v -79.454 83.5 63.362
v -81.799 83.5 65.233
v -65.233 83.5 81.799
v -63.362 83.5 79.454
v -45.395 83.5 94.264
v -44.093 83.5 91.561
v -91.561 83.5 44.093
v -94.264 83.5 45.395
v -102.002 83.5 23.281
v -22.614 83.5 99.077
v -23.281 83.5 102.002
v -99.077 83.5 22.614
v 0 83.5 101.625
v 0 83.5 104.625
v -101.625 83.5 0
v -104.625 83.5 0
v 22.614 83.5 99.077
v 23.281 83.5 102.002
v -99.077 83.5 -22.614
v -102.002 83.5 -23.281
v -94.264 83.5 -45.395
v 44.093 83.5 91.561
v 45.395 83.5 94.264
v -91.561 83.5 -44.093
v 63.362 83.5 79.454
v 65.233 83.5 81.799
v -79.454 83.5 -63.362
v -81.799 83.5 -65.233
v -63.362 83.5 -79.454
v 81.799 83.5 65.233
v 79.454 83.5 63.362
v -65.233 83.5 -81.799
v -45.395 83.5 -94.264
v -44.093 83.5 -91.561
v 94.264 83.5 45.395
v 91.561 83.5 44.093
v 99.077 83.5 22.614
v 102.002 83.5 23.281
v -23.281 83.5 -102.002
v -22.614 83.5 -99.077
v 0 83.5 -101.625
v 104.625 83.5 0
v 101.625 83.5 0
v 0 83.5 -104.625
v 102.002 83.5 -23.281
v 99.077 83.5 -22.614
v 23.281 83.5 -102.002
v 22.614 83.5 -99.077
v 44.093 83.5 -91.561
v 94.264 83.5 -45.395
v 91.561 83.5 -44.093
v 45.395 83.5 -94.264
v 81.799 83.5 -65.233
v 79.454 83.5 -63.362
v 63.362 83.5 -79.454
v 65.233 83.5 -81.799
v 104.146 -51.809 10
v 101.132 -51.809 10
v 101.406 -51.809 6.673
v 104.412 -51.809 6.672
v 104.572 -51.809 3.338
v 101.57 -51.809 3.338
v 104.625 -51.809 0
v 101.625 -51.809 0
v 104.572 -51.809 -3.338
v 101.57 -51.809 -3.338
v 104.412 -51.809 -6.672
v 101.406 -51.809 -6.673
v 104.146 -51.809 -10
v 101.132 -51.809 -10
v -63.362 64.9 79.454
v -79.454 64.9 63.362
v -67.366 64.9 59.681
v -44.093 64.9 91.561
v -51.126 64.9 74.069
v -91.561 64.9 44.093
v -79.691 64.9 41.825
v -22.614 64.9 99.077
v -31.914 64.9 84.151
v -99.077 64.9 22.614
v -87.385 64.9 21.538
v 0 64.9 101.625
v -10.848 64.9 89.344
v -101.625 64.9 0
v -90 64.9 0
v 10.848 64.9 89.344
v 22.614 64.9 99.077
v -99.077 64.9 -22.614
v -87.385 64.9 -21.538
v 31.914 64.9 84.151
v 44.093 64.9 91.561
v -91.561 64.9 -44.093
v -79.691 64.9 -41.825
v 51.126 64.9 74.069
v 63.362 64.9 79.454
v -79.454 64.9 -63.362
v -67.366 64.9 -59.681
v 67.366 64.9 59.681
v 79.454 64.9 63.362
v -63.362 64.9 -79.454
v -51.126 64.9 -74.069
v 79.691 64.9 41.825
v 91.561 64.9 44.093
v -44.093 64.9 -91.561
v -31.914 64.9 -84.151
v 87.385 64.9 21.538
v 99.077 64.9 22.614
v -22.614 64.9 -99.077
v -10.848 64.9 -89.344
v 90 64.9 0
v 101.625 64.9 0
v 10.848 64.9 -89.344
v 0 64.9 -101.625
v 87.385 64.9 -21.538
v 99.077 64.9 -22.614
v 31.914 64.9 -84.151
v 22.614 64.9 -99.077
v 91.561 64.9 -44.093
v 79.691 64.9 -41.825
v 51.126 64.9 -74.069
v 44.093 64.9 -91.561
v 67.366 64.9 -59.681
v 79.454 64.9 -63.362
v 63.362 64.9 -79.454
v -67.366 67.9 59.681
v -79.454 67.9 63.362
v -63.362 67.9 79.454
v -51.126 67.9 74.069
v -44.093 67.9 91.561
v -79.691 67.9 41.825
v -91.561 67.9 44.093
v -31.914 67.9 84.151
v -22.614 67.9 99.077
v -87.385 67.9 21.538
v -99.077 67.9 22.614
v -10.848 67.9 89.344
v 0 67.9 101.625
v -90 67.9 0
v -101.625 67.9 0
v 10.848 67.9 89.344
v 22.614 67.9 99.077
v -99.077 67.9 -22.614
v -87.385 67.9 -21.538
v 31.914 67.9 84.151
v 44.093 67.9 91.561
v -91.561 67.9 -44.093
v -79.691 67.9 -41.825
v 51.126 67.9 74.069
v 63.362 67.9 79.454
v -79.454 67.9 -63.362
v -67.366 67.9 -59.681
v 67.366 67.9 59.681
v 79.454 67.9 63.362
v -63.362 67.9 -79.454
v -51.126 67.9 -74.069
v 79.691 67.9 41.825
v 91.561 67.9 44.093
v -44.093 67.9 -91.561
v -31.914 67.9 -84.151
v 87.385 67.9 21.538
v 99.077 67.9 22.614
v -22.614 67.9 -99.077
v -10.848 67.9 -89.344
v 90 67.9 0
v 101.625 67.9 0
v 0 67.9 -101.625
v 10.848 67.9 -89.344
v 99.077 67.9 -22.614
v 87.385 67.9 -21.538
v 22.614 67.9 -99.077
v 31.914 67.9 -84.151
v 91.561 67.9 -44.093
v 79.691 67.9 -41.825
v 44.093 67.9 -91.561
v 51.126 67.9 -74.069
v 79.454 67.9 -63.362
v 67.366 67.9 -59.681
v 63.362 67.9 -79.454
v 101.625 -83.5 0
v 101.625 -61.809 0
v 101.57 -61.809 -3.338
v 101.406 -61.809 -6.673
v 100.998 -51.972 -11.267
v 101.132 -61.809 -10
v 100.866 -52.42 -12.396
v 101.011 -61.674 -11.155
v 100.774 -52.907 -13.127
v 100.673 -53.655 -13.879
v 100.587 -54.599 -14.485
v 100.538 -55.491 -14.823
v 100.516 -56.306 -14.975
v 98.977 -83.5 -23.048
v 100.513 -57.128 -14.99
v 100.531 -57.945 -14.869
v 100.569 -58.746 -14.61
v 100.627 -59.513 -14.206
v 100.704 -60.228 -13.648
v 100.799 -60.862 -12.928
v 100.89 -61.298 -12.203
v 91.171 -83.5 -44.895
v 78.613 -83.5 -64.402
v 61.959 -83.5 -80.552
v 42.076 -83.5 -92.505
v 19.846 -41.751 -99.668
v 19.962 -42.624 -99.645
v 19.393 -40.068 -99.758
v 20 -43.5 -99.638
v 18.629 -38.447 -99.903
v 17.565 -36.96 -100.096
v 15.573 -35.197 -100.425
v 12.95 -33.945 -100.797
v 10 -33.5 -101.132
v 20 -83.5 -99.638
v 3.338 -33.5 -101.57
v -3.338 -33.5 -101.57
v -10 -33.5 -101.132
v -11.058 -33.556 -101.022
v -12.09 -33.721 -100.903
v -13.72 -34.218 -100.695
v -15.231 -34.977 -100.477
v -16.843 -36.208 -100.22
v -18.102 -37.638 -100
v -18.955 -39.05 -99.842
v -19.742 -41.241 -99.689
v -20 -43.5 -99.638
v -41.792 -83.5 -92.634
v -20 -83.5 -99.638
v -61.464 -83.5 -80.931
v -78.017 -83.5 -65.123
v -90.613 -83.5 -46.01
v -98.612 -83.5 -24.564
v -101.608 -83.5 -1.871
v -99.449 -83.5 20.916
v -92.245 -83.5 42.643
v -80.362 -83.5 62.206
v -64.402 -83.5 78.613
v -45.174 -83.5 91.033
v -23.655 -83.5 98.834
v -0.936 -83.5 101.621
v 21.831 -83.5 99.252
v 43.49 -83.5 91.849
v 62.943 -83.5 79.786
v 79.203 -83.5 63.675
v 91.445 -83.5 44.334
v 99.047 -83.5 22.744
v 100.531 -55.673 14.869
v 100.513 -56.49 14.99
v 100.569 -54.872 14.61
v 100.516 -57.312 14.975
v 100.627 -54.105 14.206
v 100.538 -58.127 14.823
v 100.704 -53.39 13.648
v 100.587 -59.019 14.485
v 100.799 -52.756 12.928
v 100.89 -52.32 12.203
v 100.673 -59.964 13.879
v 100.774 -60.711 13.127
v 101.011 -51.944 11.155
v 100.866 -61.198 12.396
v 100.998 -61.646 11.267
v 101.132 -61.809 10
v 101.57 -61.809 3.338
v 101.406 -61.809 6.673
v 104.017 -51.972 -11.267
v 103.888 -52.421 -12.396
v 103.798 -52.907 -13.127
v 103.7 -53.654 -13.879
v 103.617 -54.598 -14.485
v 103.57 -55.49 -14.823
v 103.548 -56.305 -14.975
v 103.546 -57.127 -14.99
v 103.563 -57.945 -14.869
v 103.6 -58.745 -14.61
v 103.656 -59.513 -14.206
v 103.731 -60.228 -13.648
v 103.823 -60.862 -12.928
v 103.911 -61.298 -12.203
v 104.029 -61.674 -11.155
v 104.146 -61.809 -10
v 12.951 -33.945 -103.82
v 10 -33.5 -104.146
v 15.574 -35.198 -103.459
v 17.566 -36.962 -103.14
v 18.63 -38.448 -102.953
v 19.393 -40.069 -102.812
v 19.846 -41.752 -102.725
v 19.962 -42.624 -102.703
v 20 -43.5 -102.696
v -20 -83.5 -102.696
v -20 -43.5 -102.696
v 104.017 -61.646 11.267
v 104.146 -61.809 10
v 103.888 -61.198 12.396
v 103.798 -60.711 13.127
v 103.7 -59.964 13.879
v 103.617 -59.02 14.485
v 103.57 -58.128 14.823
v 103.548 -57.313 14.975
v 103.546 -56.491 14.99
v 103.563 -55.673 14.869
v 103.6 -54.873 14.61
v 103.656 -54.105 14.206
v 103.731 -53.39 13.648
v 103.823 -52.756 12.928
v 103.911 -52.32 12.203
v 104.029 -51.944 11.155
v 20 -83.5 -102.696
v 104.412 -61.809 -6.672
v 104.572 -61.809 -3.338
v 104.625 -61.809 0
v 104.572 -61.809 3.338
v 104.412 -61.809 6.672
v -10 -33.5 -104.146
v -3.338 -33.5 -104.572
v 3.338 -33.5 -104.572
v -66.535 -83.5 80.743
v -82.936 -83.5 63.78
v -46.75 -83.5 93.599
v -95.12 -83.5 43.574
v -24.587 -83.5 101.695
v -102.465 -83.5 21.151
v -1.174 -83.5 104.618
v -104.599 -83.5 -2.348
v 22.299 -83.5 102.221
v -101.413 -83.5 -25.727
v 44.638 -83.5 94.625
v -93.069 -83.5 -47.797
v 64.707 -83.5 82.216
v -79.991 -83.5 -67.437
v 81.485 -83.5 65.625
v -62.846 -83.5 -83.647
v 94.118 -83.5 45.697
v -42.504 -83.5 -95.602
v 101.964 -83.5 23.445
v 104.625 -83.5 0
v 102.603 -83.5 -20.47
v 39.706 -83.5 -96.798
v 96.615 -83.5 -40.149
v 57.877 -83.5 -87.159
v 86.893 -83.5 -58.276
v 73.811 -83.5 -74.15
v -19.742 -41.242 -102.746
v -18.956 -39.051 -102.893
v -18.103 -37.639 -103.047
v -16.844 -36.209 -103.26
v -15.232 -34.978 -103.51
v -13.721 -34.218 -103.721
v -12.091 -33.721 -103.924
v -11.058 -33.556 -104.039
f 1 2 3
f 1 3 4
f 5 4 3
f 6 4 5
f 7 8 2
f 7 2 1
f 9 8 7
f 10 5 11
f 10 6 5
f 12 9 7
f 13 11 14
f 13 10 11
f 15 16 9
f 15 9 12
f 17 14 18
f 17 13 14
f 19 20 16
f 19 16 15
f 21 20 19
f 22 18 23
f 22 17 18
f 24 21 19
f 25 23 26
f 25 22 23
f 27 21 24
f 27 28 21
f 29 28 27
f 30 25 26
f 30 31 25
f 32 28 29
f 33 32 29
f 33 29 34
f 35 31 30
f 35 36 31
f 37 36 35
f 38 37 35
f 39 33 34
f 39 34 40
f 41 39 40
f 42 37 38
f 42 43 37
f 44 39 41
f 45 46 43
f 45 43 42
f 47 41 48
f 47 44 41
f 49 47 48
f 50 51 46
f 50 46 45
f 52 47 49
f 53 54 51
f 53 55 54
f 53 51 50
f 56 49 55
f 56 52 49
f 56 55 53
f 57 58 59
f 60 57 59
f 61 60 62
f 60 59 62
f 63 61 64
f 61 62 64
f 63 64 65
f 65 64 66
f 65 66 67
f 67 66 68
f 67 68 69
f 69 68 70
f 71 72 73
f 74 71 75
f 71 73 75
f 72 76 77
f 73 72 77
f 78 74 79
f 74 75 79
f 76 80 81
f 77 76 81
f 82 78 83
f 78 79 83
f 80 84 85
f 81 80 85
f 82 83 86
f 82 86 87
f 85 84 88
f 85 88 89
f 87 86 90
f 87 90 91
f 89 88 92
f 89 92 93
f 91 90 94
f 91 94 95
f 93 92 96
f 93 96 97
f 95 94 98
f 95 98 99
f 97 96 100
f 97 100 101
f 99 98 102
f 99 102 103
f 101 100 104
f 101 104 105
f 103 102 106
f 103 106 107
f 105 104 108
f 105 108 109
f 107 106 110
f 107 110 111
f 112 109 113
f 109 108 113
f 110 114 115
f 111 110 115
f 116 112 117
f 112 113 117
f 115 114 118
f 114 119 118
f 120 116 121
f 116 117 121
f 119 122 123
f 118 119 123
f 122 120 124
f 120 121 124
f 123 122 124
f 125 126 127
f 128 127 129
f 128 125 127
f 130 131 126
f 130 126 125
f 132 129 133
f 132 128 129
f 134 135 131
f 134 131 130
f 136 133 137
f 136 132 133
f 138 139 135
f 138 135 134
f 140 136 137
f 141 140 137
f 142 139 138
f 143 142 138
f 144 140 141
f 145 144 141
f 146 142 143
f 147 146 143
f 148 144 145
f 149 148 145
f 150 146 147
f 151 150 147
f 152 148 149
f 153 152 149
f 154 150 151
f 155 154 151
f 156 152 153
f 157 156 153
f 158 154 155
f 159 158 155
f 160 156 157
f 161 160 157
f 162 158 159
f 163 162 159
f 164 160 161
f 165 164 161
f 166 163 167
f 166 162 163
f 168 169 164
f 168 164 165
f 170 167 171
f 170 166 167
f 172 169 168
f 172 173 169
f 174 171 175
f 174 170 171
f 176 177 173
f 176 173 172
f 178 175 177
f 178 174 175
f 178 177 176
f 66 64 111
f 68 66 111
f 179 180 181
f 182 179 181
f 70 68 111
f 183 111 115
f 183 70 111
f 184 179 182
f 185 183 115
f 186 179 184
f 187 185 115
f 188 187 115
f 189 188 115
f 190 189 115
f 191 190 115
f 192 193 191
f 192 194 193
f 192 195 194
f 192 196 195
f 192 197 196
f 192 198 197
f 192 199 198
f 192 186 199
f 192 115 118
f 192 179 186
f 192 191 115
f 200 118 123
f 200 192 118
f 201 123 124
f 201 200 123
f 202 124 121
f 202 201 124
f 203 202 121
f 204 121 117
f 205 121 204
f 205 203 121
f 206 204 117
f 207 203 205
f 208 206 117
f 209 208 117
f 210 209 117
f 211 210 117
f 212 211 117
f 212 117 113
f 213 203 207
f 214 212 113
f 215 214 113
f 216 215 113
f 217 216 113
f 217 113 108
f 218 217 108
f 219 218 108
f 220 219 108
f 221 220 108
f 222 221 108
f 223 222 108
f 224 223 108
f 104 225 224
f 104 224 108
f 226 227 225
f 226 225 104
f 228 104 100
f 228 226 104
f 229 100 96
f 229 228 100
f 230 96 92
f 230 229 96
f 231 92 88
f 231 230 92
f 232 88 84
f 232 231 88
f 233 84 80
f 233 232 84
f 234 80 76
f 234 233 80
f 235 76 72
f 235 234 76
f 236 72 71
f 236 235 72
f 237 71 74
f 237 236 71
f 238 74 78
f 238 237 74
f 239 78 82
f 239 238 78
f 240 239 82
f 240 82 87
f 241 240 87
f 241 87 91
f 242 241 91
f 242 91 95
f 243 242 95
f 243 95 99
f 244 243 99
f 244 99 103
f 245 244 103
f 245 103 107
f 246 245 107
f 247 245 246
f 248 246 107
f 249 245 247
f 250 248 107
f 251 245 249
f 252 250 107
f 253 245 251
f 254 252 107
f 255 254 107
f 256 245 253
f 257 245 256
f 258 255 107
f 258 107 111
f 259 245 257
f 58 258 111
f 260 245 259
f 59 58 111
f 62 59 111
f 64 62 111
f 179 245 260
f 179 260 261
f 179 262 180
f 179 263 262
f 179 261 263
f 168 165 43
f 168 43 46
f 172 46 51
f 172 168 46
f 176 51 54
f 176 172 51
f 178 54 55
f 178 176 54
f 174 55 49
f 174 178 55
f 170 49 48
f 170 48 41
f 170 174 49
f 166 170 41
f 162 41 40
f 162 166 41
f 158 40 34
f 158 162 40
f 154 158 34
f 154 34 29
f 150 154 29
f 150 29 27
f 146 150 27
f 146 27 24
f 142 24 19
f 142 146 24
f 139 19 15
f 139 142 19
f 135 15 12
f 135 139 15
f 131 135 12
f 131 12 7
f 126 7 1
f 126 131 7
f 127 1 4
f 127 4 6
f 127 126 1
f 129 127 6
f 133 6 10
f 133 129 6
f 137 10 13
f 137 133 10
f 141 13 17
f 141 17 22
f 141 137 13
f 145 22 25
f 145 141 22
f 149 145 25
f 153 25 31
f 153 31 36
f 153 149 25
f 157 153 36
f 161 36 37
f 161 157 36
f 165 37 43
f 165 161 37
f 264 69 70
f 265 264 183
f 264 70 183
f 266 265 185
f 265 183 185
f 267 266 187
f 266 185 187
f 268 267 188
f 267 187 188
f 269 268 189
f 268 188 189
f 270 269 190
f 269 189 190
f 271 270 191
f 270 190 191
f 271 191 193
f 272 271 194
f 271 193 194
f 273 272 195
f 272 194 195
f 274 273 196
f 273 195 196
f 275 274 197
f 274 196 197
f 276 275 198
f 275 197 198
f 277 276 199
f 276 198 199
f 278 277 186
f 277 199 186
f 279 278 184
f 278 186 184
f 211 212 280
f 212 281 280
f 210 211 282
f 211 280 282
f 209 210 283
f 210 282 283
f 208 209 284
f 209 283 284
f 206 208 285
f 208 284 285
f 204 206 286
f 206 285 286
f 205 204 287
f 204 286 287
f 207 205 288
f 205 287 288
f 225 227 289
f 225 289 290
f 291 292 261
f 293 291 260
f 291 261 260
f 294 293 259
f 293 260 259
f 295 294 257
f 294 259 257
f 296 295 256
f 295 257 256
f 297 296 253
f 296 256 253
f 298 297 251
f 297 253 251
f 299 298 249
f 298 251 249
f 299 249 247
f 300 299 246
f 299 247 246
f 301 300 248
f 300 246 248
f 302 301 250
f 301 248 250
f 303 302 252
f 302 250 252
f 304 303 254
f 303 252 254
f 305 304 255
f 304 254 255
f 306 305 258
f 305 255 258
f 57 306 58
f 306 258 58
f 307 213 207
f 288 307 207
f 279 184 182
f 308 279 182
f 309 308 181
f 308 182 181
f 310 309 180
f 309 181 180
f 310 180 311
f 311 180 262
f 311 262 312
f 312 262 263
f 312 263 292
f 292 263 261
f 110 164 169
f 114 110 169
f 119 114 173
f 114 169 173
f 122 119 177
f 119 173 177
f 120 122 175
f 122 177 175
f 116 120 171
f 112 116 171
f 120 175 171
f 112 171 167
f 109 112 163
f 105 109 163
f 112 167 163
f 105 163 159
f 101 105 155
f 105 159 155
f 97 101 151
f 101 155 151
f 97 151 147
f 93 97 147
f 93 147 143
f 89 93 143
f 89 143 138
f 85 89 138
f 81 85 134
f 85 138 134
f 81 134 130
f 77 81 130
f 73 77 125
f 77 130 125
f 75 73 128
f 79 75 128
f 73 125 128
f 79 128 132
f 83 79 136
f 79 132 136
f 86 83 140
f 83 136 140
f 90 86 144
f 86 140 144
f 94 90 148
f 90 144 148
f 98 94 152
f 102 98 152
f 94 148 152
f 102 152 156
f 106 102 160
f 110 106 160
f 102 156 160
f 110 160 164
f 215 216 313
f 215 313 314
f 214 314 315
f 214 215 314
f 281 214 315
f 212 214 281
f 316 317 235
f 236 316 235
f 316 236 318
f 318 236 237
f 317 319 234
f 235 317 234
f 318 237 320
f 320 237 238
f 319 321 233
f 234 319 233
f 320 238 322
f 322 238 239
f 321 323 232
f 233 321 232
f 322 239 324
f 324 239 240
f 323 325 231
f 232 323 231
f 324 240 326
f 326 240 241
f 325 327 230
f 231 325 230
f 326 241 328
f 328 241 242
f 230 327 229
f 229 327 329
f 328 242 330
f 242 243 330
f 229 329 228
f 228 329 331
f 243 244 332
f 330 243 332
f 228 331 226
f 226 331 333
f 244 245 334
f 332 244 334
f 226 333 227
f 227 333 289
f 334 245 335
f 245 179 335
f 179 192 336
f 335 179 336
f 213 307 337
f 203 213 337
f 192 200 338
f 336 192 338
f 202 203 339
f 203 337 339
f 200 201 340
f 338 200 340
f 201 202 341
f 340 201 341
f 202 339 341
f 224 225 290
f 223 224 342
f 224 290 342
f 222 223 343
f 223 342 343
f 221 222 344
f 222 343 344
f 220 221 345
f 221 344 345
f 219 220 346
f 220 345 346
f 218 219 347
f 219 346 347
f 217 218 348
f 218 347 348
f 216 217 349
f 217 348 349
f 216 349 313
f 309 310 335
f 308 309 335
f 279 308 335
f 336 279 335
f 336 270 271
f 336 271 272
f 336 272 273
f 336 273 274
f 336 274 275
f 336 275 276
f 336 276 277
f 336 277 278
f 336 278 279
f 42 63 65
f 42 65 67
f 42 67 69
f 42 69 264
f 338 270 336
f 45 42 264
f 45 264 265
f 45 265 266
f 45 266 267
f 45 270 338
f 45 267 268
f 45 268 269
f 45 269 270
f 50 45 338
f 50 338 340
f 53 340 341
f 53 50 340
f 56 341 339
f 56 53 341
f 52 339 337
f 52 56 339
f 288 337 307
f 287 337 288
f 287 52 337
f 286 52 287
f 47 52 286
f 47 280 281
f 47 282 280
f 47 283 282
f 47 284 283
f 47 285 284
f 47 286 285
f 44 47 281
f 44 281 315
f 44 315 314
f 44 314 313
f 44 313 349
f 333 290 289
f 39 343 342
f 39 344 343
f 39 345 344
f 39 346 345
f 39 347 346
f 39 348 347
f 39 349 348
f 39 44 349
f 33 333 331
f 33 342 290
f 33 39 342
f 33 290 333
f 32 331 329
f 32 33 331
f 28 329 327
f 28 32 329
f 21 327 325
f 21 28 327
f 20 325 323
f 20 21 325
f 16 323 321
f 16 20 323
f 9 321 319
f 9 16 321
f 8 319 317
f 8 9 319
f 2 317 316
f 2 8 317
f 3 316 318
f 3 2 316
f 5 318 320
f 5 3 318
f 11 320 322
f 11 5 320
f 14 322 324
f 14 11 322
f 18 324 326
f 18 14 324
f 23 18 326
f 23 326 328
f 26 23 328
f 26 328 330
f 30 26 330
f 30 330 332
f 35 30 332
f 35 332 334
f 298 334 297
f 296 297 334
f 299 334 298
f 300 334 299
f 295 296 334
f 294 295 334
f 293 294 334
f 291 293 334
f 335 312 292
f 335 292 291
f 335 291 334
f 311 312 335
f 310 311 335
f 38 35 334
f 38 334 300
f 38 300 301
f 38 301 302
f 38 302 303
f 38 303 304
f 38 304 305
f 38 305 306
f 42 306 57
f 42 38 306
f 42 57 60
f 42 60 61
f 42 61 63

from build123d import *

# Parameters (mm, degrees)
SKETCH1_R           = 104.625
SKETCH1_R_2         = 101.625
BOSS_EXTRUDE1_DEPTH = 83.5
CUT_EXTRUDE1_REACH  = 106.625
SKETCH2_W           = 40
SKETCH2_H           = 50
CUT_EXTRUDE2_REACH  = 106.625
SKETCH4_R           = 101.625
SKETCH4_R_2         = 90
BOSS_EXTRUDE2_DEPTH = 3
FILLET1_R           = 10


with BuildPart() as part:
    # Sketch1 → Boss-Extrude1 (new body, symmetric)
    with BuildSketch(Plane(origin=(0, 0, 0), x_dir=(1, 0, 0), z_dir=(0, 1, 0))):
        Circle(SKETCH1_R)
        Circle(SKETCH1_R_2, mode=Mode.SUBTRACT)
    extrude(amount=BOSS_EXTRUDE1_DEPTH, both=True)

    # Sketch2 → Cut-Extrude1 (cut, up to next)
    with BuildSketch(Plane.XY, mode=Mode.PRIVATE) as cut_extrude1_sk1:
        with Locations((0, -58.5)):
            Rectangle(SKETCH2_W, SKETCH2_H)
    cut_extrude1_tool1 = extrude(cut_extrude1_sk1.sketch, amount=-CUT_EXTRUDE1_REACH, mode=Mode.PRIVATE) & part.part
    add(cut_extrude1_tool1.solids().sort_by_distance((0, -58.5, 0))[0], mode=Mode.SUBTRACT)

    # Sketch3 → Cut-Extrude2 (cut, up to next)
    with BuildSketch(Plane(origin=(0, 0, 0), x_dir=(0, 0, -1), z_dir=(1, 0, 0)), mode=Mode.PRIVATE) as cut_extrude2_sk1:
        with BuildLine():
            Line((-10, -51.809036258), (10, -51.809036258))
            ThreePointArc((10, -51.809036258), (15, -56.809036258), (10, -61.809036258))
            Line((10, -61.809036258), (-10, -61.809036258))
            ThreePointArc((-10, -61.809036258), (-15, -56.809036258), (-10, -51.809036258))
        make_face()
    cut_extrude2_tool1 = extrude(cut_extrude2_sk1.sketch, amount=CUT_EXTRUDE2_REACH, mode=Mode.PRIVATE) & part.part
    add(cut_extrude2_tool1.solids().sort_by_distance((0, -56.809036, 0))[0], mode=Mode.SUBTRACT)

    # Sketch4 → Boss-Extrude2 (add)
    with BuildSketch(Plane(origin=(0, 67.9, 0), x_dir=(1, 0, 0), z_dir=(0, 1, 0))):
        Circle(SKETCH4_R)
        Circle(SKETCH4_R_2, mode=Mode.SUBTRACT)
    extrude(amount=-BOSS_EXTRUDE2_DEPTH)

    # Fillet1
    fillet1_edges = [part.edges().sort_by_distance(p)[0] for p in [
        (20, -33.5, -101.166583758),
        (-20, -33.5, -101.166583758),
    ]]
    fillet(fillet1_edges, radius=FILLET1_R)


solid = part.part
